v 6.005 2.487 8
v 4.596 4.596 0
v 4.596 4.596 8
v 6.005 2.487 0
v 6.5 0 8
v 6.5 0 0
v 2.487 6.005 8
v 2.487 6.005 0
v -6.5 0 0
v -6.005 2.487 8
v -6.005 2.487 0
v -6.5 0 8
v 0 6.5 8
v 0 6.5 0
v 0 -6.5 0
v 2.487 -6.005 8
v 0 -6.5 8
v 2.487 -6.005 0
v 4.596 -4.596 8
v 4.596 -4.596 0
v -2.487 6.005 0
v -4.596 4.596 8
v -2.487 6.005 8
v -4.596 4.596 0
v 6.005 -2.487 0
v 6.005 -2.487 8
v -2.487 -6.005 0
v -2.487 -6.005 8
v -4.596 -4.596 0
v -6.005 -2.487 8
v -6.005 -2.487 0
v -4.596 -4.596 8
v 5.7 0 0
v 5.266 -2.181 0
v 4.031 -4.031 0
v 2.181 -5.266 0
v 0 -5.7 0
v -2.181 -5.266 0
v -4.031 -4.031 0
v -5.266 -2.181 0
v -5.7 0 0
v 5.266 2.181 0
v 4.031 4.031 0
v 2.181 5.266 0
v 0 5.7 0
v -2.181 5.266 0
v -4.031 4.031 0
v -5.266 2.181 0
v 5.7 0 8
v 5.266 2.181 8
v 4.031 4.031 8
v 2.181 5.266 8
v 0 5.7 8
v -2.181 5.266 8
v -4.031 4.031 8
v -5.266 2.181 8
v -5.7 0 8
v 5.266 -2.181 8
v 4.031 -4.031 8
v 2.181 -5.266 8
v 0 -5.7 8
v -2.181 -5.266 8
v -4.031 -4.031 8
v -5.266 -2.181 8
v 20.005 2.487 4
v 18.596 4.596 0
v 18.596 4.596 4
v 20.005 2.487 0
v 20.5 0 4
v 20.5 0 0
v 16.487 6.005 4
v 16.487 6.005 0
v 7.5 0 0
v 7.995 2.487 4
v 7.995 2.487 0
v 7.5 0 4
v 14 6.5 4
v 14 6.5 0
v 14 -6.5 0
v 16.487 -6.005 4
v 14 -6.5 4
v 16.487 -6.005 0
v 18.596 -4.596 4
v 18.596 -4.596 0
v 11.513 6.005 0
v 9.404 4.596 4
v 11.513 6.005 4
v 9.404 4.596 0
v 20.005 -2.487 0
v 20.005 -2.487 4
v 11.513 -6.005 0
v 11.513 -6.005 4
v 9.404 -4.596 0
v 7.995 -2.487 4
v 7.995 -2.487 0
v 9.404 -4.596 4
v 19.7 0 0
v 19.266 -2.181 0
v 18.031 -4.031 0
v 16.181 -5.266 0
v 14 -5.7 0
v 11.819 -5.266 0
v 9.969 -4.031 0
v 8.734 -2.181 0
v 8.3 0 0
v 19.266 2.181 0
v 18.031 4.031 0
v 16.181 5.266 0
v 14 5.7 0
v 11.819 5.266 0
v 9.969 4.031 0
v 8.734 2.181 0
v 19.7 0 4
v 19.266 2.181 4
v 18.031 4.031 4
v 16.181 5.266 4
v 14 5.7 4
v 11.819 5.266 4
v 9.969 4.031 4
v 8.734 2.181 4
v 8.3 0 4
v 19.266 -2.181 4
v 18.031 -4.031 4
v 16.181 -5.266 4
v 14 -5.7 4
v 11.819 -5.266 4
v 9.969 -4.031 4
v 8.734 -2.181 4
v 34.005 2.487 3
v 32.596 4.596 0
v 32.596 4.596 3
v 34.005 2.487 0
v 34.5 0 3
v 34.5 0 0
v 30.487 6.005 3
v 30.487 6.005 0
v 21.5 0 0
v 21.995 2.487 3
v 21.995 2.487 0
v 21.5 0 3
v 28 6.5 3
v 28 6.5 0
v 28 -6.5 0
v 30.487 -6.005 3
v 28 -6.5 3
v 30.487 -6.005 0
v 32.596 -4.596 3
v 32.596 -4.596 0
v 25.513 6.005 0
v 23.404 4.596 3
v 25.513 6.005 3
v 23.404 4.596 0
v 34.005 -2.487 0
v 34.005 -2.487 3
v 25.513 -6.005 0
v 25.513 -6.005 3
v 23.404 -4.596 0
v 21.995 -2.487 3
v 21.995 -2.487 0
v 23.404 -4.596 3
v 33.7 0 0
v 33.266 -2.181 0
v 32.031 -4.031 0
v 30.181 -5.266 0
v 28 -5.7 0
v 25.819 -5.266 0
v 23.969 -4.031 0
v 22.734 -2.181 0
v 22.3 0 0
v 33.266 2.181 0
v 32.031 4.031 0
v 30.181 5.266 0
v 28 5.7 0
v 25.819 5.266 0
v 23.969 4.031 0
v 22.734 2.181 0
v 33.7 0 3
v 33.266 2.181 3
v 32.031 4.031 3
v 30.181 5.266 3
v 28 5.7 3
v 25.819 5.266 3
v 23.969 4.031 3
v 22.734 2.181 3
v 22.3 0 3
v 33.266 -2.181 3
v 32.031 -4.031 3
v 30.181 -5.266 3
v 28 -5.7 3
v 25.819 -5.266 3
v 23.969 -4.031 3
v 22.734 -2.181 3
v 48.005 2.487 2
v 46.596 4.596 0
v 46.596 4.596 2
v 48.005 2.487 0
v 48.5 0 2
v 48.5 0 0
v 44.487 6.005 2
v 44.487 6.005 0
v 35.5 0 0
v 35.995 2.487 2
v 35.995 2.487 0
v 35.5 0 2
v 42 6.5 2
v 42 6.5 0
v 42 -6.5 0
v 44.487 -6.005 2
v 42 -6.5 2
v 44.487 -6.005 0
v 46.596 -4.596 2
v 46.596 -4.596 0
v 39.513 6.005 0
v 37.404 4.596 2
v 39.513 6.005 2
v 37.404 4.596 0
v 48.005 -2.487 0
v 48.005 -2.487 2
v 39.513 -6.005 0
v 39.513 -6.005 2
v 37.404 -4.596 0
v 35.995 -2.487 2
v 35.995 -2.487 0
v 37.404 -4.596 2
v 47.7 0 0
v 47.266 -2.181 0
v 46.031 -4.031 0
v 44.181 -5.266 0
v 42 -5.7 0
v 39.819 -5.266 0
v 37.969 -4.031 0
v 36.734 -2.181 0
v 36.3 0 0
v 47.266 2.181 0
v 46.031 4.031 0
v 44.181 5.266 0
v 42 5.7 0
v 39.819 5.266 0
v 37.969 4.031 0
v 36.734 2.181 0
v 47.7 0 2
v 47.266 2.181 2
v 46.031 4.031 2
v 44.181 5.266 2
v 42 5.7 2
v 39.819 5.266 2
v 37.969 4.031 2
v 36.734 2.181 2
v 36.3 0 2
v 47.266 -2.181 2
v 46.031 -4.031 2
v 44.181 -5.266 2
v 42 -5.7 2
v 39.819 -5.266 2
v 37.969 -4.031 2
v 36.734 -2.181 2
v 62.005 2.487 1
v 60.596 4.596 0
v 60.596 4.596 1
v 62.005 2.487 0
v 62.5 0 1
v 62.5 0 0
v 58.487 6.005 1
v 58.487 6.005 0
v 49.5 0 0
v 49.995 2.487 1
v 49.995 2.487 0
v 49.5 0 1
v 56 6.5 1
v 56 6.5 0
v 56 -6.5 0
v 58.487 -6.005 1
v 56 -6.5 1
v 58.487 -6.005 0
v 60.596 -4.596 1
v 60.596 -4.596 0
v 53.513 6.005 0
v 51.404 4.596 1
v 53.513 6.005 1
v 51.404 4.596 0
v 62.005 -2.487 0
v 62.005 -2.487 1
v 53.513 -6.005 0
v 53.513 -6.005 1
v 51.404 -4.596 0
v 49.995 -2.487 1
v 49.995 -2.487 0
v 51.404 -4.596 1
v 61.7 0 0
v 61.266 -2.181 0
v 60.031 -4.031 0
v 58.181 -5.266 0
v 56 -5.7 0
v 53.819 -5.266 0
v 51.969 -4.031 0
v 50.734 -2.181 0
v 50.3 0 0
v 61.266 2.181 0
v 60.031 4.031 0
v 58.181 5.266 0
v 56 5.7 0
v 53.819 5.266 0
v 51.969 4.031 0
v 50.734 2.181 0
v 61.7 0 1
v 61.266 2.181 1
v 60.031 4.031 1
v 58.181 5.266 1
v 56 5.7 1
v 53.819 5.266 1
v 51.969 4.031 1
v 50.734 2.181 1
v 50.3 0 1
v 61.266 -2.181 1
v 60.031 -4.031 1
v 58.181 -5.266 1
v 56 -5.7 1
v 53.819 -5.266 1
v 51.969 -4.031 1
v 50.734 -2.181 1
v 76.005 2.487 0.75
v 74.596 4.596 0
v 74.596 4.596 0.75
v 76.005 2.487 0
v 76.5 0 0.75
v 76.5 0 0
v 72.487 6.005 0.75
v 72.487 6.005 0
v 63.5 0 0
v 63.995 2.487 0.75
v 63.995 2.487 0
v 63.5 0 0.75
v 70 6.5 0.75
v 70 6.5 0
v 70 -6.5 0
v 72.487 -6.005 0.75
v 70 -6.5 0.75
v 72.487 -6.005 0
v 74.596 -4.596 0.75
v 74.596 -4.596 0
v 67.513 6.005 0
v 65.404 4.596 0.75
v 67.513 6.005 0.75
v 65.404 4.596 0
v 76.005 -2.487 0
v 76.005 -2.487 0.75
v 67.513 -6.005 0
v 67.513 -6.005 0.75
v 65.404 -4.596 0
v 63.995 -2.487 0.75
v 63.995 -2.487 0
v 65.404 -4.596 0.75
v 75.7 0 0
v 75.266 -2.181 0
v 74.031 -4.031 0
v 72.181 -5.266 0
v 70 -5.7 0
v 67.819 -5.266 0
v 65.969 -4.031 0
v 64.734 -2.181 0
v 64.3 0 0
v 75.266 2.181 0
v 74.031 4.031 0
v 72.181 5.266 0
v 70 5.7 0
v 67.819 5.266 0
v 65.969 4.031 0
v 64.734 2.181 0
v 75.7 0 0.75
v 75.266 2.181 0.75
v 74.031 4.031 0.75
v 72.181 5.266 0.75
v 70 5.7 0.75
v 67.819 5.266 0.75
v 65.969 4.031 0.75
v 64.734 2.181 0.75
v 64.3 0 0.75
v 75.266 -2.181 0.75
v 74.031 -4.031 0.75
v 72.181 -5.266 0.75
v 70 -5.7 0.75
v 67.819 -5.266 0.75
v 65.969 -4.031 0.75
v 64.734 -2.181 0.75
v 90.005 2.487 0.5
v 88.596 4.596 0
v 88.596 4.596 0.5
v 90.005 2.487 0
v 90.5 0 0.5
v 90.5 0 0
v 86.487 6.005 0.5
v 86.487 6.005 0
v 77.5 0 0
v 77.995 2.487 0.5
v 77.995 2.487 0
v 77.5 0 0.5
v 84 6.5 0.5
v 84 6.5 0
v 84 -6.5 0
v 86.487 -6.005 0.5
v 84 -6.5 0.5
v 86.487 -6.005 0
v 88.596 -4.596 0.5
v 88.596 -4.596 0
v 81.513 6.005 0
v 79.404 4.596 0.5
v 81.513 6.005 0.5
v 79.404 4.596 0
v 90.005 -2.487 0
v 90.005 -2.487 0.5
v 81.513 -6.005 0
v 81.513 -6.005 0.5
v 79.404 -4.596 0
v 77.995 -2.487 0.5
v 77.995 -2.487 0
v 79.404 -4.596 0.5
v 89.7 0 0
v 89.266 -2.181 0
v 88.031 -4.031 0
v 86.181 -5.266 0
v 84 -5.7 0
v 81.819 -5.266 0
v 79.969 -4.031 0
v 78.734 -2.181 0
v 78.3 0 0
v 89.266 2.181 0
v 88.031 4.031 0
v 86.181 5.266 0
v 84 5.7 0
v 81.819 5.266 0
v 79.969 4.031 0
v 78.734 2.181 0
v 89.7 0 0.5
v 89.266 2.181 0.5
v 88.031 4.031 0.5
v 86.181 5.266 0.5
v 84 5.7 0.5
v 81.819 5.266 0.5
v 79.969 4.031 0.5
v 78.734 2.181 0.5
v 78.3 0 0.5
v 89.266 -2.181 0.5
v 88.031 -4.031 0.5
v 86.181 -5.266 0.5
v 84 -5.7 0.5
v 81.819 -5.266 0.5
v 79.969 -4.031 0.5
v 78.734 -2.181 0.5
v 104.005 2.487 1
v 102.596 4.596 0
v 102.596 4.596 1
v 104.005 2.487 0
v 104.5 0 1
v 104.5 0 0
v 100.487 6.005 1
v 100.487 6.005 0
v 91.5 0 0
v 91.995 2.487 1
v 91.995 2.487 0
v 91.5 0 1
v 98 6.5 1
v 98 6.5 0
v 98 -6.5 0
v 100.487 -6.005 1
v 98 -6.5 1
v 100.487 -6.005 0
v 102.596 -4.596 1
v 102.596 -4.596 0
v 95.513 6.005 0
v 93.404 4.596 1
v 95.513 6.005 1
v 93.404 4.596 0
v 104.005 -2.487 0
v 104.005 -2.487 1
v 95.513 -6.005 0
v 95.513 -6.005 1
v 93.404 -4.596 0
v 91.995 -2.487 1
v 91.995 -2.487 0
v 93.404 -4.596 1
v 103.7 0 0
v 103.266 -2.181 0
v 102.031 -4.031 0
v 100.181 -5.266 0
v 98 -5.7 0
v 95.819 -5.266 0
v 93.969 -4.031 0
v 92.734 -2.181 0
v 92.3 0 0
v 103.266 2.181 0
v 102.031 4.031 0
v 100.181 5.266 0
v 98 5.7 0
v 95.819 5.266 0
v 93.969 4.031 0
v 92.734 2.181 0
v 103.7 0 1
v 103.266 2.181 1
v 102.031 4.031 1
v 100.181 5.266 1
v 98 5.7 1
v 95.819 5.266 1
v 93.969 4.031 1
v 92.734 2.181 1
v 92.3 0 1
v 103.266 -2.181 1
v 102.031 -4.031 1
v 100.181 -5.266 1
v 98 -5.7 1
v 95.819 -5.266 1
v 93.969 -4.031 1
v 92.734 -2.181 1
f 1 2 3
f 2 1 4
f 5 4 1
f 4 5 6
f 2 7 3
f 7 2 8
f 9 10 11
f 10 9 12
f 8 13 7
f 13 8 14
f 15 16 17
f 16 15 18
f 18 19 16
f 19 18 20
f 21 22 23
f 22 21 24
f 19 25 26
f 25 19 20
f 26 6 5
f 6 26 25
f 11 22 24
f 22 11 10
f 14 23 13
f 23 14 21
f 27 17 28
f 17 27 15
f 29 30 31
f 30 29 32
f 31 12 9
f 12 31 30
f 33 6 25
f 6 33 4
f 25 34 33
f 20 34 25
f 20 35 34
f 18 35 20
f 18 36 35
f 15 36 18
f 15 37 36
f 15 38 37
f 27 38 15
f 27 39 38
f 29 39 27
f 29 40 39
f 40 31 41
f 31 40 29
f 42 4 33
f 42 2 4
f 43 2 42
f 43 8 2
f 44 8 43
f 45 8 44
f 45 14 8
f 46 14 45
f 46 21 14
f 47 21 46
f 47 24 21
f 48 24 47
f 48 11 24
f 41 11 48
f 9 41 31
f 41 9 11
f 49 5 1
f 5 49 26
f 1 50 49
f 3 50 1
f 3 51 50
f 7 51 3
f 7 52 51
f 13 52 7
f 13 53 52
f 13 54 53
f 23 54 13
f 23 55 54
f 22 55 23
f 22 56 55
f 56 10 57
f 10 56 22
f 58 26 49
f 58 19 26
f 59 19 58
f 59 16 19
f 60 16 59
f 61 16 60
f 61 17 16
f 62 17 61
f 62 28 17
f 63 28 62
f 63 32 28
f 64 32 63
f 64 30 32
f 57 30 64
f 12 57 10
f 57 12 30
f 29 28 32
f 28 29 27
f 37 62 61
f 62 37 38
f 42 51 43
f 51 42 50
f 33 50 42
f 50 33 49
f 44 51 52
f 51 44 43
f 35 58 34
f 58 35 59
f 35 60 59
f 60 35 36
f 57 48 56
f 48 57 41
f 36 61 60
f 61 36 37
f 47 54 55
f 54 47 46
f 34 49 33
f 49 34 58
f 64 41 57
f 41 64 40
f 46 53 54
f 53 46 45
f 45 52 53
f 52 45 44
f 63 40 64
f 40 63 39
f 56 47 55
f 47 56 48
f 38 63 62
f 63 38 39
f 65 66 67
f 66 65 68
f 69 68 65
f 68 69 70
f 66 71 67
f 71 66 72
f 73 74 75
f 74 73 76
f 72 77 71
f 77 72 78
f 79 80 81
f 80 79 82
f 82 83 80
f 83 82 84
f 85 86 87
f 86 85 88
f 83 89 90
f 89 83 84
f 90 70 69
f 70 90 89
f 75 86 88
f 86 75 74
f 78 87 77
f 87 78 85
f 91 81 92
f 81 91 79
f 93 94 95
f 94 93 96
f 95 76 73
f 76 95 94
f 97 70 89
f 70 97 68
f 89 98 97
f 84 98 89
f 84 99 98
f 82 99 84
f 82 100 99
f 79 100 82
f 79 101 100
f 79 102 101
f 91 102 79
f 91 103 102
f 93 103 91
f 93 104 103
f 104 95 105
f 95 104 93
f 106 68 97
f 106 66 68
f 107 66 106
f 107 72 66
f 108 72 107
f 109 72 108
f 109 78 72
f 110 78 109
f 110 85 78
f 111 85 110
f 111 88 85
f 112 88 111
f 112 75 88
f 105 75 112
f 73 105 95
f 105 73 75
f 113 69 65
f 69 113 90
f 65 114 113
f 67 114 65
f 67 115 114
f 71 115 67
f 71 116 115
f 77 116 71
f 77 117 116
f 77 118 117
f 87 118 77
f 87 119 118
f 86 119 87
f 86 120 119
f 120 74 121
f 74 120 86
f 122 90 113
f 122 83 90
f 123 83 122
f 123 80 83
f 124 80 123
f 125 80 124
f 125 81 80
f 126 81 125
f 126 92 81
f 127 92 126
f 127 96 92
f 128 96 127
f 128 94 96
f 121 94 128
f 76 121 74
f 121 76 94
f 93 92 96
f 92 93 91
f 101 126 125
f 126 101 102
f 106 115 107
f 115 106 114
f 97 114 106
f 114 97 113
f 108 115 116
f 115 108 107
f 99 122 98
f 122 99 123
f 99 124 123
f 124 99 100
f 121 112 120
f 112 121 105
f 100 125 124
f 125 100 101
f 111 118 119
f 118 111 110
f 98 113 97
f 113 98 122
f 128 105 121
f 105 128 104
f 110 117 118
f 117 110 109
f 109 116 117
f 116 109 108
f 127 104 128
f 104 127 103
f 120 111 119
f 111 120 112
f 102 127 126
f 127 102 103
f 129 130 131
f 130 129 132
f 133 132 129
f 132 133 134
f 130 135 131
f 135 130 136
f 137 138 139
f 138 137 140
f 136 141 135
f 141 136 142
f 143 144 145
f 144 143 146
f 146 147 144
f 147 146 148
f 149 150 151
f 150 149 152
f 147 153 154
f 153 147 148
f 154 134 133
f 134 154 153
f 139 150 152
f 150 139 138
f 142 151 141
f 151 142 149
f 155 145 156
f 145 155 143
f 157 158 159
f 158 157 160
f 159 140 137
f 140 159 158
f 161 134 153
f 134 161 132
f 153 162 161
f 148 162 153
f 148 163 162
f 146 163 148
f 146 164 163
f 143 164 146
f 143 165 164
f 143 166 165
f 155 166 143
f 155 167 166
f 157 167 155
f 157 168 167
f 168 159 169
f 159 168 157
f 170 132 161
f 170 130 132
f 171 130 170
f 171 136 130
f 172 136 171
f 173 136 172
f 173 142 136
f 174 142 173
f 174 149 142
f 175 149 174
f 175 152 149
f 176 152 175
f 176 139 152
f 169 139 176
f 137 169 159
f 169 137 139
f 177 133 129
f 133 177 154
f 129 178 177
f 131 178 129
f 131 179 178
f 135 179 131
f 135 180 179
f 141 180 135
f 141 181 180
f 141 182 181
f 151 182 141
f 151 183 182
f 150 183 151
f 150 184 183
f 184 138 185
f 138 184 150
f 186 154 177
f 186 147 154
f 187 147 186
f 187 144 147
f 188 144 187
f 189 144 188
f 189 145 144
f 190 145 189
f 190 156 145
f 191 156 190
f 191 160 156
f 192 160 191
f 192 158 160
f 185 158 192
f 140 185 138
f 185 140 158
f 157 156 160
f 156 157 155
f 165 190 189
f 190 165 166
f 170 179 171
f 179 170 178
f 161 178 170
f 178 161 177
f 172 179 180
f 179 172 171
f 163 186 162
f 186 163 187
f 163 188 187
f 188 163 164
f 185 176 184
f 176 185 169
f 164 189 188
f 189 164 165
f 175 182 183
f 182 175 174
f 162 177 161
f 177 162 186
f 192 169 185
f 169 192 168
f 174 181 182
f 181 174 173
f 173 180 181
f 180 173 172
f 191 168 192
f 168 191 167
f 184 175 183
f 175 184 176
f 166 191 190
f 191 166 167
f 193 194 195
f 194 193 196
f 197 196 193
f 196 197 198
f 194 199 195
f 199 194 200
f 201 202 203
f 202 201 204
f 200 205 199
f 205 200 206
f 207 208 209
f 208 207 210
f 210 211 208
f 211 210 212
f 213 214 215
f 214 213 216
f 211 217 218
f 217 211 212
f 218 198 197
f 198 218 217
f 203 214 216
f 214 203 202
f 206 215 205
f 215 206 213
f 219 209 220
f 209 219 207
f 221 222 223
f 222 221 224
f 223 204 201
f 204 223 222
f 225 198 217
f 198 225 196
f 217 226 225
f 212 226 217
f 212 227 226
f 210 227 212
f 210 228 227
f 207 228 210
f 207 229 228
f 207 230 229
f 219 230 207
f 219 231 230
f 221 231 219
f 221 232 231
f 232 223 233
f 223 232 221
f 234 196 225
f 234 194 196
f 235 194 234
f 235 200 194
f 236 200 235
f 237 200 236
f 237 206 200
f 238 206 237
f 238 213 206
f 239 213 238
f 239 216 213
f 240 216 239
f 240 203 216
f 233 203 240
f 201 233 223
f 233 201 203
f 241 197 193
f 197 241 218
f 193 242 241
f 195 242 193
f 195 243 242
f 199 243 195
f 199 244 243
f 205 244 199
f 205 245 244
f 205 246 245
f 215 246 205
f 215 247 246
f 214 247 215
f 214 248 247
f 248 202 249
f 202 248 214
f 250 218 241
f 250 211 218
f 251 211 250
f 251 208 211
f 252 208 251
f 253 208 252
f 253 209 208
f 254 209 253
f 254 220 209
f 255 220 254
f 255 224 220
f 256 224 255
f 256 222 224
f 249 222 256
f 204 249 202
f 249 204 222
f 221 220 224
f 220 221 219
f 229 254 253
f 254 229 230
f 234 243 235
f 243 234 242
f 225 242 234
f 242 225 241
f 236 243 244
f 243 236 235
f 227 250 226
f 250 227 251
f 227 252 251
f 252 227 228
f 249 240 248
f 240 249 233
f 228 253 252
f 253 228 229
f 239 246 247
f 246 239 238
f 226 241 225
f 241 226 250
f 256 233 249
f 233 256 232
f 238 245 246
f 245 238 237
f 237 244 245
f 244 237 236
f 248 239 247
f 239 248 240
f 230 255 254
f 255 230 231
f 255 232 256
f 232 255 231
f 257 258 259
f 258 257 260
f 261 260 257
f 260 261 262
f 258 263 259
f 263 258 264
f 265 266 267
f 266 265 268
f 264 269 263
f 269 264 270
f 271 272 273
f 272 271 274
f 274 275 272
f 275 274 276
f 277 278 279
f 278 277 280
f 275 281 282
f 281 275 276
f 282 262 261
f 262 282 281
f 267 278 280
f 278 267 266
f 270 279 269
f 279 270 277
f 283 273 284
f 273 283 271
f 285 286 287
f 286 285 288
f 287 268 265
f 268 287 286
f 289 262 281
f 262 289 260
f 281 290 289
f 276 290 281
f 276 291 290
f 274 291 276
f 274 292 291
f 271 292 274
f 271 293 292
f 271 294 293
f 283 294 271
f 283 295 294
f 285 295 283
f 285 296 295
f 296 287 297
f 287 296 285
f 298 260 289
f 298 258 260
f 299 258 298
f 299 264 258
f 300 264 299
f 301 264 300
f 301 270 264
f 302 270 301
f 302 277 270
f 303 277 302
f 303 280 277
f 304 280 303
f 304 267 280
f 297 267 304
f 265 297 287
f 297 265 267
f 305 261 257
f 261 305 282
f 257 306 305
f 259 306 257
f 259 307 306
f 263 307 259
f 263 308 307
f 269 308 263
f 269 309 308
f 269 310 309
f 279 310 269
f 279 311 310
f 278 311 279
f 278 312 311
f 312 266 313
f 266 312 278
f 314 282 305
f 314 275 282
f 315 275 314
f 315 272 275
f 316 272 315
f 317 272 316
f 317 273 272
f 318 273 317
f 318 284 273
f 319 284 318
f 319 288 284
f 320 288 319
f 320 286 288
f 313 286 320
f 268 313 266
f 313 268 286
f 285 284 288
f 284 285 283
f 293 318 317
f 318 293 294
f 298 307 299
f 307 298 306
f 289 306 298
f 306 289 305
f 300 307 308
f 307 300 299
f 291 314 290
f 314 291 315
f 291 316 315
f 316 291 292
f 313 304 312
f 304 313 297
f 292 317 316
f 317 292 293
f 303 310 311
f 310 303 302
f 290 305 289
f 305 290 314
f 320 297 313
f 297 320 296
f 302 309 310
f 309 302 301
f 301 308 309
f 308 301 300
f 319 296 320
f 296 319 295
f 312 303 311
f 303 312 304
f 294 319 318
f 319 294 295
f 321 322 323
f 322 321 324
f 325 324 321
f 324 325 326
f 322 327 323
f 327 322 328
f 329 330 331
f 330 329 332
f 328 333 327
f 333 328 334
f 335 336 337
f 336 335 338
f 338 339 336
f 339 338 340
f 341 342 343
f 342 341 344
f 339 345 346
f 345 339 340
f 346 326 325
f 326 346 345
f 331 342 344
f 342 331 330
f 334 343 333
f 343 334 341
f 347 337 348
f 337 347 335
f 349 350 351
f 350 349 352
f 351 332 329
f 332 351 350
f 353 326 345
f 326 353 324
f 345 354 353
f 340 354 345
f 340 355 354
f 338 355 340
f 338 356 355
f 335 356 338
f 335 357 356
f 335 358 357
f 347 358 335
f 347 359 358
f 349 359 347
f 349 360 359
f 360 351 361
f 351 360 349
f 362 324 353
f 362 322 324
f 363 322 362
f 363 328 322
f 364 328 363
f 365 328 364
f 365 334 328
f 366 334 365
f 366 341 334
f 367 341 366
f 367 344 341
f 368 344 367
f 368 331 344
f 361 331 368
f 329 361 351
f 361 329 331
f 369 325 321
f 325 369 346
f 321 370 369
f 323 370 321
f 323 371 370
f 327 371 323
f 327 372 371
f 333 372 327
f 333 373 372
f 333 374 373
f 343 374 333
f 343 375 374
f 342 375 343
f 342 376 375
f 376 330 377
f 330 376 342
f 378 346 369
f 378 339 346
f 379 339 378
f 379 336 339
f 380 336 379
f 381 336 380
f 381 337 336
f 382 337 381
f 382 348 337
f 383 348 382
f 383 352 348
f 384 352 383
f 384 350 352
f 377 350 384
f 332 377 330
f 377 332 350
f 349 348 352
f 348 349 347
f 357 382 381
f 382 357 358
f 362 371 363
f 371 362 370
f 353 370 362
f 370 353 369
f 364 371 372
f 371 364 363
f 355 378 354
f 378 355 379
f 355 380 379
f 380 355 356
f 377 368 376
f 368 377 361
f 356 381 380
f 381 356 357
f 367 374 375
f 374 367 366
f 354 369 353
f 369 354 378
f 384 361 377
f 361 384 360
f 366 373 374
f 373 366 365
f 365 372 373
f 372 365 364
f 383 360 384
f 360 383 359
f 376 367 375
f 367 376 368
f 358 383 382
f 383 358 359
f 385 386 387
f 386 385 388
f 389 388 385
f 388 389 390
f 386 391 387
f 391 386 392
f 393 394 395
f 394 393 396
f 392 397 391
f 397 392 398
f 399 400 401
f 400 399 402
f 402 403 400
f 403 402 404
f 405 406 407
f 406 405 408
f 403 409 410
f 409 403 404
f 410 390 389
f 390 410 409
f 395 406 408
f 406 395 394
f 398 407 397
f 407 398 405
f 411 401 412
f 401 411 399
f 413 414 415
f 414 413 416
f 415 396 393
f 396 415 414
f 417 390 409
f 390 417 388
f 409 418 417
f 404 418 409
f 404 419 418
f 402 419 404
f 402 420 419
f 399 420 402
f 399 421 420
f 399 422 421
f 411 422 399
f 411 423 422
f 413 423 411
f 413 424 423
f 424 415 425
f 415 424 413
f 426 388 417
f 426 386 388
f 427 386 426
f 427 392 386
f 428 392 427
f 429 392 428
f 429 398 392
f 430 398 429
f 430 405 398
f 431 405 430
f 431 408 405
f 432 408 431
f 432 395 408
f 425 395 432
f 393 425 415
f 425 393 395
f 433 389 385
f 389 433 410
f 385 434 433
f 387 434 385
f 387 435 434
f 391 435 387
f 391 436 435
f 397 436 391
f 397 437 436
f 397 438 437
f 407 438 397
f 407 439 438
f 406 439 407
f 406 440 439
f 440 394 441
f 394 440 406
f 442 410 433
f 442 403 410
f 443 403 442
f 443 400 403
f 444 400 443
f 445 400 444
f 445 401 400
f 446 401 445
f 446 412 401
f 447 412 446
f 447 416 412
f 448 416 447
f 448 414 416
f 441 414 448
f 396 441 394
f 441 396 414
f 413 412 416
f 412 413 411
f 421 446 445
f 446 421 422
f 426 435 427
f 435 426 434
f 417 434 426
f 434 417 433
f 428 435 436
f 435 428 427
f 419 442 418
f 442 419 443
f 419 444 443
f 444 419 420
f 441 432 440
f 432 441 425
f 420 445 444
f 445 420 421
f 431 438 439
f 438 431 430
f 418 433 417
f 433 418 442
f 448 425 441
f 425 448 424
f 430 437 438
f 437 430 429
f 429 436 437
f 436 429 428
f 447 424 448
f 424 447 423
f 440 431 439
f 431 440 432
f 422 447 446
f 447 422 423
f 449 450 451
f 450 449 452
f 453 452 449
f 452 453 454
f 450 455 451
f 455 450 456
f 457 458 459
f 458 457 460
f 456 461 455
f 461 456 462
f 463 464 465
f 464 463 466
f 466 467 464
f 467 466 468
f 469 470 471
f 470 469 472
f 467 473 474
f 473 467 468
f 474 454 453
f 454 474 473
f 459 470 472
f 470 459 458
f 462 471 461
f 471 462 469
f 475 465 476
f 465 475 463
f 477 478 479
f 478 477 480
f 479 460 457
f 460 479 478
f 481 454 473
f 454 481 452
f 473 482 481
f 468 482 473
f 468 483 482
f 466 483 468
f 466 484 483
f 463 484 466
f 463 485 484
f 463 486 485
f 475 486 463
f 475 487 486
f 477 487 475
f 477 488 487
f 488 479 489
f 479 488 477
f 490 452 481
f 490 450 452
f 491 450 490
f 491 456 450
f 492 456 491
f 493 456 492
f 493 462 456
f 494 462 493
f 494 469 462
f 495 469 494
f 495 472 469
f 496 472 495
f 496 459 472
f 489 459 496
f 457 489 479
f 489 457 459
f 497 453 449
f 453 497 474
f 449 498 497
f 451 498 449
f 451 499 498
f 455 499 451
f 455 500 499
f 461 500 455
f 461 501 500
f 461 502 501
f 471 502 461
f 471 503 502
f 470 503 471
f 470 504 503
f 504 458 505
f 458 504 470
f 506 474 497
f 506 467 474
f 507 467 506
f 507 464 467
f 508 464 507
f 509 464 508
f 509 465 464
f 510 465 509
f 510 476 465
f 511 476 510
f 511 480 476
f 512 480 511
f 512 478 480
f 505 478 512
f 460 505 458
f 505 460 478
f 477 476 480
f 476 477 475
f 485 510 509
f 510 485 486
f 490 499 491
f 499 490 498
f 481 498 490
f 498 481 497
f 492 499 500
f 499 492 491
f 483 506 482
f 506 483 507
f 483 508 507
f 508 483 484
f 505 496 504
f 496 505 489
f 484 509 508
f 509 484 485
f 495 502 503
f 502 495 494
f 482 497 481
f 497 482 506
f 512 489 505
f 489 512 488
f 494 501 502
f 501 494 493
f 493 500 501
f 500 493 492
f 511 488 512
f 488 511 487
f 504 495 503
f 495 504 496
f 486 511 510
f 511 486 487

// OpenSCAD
// spacers to help get the lens position right

heights=[8,4,3,2,1,0.75,0.5];
for(i=[0:len(heights)]){
    translate([i*14,0,0]) difference(){
        cylinder(r=13/2, h=heights[i], $fn=16);
        cylinder(r=13/2-0.8, h=999, $fn=16, center=true);
    }
}
